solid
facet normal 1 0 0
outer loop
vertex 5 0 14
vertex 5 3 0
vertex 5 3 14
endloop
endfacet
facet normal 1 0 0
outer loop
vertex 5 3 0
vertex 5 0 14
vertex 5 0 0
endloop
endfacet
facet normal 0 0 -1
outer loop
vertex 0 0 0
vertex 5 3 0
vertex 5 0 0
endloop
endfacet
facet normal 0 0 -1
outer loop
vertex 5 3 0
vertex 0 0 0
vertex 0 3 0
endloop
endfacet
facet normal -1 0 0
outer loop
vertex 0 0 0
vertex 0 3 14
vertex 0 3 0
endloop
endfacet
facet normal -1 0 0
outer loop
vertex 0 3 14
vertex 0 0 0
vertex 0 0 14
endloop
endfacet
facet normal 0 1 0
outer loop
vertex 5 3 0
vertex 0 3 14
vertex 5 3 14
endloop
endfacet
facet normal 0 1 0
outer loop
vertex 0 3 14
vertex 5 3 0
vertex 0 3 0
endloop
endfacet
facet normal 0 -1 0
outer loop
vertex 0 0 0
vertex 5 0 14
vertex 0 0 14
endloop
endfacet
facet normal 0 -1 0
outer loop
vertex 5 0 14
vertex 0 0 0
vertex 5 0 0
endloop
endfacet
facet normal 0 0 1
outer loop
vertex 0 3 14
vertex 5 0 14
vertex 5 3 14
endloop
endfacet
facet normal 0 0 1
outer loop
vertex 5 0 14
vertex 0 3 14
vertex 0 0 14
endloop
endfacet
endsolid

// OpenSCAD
translate([2.5, 1.5, 1.0]) color([0.8918421087116969, 0.42205651792049836, 0.08403205823715598]) cube([5, 3, 2], center=true);
translate([2.5, 1.5, 3.0]) color([0.1047646210762947, 0.06292282863863541, 0.4151614515022839]) cube([5, 3, 2], center=true);
translate([2.5, 1.5, 5.0]) color([0.15615697007089357, 0.9545538427732947, 0.7913428503775491]) cube([5, 3, 2], center=true);
translate([2.5, 1.5, 7.0]) color([0.43108631436838285, 0.41701950900356644, 0.4966247746294912]) cube([5, 3, 2], center=true);
translate([2.5, 1.5, 9.0]) color([0.86405767472269, 0.32449912818180593, 0.25258592574699623]) cube([5, 3, 2], center=true);
translate([2.5, 1.5, 11.0]) color([0.35250302456564797, 0.12137799977699892, 0.691775150815975]) cube([5, 3, 2], center=true);
translate([2.5, 1.5, 13.0]) color([0.34544510653523897, 0.17790766067776254, 0.830270051764872]) cube([5, 3, 2], center=true);
